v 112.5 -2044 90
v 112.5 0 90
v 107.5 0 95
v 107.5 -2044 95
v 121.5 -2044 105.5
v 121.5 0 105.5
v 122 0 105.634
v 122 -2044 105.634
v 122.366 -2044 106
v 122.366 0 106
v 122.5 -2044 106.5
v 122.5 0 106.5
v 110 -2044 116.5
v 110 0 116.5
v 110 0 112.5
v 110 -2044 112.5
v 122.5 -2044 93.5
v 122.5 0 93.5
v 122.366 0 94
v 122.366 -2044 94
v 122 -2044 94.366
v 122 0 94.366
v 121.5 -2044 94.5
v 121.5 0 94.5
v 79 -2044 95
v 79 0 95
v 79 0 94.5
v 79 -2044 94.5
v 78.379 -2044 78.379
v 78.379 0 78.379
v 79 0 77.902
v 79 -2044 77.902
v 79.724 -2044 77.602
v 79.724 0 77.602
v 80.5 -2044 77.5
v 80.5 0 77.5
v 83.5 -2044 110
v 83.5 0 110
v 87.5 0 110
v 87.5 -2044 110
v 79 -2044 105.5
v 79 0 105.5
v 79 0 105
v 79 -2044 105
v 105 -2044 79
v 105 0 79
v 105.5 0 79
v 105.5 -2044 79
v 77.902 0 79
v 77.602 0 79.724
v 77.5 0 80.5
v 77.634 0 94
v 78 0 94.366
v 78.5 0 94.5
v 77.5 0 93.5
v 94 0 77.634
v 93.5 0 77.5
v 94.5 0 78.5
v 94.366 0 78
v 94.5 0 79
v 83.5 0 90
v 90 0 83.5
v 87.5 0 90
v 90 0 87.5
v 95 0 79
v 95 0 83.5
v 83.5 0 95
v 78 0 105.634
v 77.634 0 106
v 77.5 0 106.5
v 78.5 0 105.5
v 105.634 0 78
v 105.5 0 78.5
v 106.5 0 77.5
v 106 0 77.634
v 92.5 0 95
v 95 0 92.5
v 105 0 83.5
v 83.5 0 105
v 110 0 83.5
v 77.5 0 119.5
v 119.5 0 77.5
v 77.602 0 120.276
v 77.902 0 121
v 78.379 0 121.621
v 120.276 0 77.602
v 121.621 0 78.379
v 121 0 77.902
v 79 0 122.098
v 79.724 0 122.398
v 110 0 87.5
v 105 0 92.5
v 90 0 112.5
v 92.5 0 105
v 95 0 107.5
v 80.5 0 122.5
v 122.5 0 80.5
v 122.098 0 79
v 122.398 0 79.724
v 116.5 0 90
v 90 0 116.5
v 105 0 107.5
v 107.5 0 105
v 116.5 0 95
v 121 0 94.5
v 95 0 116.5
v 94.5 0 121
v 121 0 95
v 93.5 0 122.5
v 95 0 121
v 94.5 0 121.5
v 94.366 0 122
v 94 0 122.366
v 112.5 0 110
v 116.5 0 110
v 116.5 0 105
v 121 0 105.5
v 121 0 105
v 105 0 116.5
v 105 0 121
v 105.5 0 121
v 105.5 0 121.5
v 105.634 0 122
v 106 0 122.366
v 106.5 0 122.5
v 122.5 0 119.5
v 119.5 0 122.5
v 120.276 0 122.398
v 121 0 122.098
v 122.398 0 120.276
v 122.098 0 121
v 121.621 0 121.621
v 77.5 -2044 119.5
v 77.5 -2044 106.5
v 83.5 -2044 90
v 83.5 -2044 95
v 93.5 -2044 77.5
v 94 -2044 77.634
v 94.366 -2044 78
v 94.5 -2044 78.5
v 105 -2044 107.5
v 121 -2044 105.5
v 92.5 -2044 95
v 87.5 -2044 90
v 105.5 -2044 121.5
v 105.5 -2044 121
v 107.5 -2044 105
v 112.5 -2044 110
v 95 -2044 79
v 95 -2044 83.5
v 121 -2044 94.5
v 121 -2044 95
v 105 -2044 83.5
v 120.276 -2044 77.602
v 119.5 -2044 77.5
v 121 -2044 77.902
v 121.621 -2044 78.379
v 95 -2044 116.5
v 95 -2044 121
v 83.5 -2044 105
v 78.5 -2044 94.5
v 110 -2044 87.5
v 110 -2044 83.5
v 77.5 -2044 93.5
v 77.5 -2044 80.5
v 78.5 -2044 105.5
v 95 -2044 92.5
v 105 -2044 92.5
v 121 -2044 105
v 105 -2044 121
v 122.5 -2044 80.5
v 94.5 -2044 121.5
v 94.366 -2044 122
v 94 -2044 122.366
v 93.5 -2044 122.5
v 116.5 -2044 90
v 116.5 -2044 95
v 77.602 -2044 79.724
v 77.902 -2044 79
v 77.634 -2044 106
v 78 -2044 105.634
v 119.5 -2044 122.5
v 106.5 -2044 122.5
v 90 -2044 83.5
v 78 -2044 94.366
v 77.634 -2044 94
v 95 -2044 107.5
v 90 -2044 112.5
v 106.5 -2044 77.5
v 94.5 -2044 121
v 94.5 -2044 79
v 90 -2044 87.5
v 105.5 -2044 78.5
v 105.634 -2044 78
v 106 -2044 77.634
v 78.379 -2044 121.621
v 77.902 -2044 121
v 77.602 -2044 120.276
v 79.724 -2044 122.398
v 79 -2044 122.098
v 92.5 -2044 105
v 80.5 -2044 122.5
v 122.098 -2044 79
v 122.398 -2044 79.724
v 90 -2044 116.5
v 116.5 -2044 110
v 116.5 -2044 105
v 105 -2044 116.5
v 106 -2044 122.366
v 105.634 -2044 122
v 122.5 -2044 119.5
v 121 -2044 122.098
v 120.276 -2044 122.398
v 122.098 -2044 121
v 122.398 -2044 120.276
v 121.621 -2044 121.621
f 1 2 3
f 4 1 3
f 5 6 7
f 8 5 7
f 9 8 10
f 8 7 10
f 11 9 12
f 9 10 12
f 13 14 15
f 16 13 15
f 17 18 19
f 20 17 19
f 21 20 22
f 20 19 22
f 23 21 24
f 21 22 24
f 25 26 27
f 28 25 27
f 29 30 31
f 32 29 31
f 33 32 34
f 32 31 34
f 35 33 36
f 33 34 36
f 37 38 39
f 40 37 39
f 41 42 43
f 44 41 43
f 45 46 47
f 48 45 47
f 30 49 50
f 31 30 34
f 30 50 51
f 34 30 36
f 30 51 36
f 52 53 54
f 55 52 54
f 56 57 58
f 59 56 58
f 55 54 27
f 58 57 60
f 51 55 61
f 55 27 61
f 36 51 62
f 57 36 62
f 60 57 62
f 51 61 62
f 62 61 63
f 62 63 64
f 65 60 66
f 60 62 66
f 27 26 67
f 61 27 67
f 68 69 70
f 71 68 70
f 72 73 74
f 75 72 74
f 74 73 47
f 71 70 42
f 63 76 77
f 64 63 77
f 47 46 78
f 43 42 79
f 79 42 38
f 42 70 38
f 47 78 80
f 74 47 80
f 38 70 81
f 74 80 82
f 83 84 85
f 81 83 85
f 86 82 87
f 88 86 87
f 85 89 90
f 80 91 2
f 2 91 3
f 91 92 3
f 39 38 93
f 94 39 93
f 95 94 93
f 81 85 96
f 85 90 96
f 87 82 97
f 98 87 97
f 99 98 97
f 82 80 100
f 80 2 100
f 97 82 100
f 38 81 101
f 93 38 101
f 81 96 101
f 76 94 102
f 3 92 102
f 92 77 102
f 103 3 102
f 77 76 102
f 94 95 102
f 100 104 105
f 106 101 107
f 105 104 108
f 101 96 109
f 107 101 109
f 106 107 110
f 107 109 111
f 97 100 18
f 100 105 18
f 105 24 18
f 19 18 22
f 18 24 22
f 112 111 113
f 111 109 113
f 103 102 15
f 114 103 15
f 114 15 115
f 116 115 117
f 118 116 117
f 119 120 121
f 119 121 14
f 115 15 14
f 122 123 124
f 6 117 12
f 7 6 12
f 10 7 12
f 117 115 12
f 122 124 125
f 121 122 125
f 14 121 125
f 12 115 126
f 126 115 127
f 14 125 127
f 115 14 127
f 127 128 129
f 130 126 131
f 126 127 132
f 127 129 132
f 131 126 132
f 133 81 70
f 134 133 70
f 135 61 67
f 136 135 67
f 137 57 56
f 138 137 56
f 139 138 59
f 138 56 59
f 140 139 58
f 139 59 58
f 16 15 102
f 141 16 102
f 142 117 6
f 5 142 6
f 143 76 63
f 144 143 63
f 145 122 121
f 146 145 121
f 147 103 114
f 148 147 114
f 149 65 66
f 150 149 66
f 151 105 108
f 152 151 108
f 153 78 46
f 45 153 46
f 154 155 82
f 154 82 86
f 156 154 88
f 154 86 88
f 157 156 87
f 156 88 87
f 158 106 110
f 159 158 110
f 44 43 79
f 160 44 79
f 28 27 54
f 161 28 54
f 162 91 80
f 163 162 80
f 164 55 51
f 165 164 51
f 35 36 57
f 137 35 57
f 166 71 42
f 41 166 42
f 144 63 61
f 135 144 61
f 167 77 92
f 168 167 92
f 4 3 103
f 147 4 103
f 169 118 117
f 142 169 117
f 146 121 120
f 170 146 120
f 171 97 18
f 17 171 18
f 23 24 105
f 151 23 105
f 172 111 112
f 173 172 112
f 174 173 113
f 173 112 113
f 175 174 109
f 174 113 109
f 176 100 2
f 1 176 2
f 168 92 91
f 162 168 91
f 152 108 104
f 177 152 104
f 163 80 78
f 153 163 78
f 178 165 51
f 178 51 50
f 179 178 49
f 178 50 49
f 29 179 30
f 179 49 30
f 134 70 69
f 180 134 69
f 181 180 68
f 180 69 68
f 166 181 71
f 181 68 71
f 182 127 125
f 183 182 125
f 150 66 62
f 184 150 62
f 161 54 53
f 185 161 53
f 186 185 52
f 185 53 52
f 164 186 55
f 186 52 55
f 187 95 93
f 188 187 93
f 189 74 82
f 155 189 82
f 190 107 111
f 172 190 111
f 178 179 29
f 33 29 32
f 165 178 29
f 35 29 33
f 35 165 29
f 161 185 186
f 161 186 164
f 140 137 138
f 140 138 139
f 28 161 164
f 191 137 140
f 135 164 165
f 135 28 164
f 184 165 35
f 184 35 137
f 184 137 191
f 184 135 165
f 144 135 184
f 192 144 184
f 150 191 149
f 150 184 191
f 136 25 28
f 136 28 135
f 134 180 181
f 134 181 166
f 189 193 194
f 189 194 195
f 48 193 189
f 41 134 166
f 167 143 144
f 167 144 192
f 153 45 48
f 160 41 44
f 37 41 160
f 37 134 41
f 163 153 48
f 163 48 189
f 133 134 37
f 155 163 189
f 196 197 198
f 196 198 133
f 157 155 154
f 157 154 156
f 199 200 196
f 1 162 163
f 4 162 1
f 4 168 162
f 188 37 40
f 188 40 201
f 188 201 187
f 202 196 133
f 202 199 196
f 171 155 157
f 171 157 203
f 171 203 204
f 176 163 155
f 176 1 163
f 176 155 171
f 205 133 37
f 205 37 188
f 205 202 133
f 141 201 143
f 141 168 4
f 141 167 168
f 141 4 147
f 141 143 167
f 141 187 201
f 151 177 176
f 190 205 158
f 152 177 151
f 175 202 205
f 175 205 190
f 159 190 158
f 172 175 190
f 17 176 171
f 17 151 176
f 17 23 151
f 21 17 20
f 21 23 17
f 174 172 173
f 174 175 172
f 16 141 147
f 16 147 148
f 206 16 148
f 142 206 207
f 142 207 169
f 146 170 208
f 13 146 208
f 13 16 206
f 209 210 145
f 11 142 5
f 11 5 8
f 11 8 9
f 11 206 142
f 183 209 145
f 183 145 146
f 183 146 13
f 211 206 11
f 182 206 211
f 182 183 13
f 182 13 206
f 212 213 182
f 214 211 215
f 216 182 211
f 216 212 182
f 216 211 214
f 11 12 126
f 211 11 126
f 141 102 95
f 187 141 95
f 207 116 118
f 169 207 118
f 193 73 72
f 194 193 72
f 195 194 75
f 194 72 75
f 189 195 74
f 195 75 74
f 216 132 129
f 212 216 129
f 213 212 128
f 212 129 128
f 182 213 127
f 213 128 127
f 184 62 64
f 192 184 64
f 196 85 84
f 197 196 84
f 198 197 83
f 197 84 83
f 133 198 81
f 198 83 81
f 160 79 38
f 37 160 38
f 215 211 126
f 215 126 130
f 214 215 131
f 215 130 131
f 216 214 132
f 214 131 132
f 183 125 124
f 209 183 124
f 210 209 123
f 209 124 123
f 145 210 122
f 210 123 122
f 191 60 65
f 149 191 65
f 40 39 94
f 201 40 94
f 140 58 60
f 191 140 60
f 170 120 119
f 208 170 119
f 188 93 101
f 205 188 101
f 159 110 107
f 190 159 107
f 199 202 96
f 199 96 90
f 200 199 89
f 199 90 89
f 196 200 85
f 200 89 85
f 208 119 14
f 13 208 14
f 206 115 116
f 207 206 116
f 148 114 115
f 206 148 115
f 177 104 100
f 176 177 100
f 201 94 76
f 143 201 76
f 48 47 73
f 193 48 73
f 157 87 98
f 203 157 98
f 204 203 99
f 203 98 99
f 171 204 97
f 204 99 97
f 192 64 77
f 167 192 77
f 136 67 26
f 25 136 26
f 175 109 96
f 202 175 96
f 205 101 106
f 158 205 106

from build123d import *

# Parameters (mm, degrees)
F1_DEPTH = 2044


with BuildPart() as f1:
    # F0 (on Front) → F1 (new body)
    with BuildSketch(Plane.XZ):
        with BuildLine():
            Line((93.5, 122.5), (80.5, 122.5))
            ThreePointArc((80.5, 122.5), (79.35195, 122.271639), (78.37868, 121.62132))
            ThreePointArc((78.37868, 121.62132), (77.728361, 120.64805), (77.5, 119.5))
            Line((77.5, 119.5), (77.5, 106.5))
            ThreePointArc((77.5, 106.5), (77.792893, 105.792893), (78.5, 105.5))
            Line((78.5, 105.5), (79, 105.5))
            Line((79, 105.5), (79, 105))
            Line((79, 105), (83.5, 105))
            Line((83.5, 105), (83.5, 110))
            Line((83.5, 110), (87.5, 110))
            Line((87.5, 110), (92.5, 105))
            Line((92.5, 105), (92.5, 100))
            Line((92.5, 100), (92.5, 95))
            Line((92.5, 95), (87.5, 90))
            Line((87.5, 90), (83.5, 90))
            Line((83.5, 90), (83.5, 95))
            Line((83.5, 95), (79, 95))
            Line((79, 95), (79, 94.5))
            Line((79, 94.5), (78.5, 94.5))
            ThreePointArc((78.5, 94.5), (77.792893, 94.207107), (77.5, 93.5))
            Line((77.5, 93.5), (77.5, 80.5))
            ThreePointArc((77.5, 80.5), (77.728361, 79.35195), (78.37868, 78.37868))
            ThreePointArc((78.37868, 78.37868), (79.35195, 77.728361), (80.5, 77.5))
            Line((80.5, 77.5), (93.5, 77.5))
            ThreePointArc((93.5, 77.5), (94.207107, 77.792893), (94.5, 78.5))
            Line((94.5, 78.5), (94.5, 79))
            Line((94.5, 79), (95, 79))
            Line((95, 79), (95, 83.5))
            Line((95, 83.5), (90, 83.5))
            Line((90, 83.5), (90, 87.5))
            Line((90, 87.5), (95, 92.5))
            Line((95, 92.5), (100, 92.5))
            Line((100, 92.5), (105, 92.5))
            Line((105, 92.5), (110, 87.5))
            Line((110, 87.5), (110, 83.5))
            Line((110, 83.5), (105, 83.5))
            Line((105, 83.5), (105, 79))
            Line((105, 79), (105.5, 79))
            Line((105.5, 79), (105.5, 78.5))
            ThreePointArc((105.5, 78.5), (105.792893, 77.792893), (106.5, 77.5))
            Line((106.5, 77.5), (119.5, 77.5))
            ThreePointArc((119.5, 77.5), (120.64805, 77.728361), (121.62132, 78.37868))
            ThreePointArc((121.62132, 78.37868), (122.271639, 79.35195), (122.5, 80.5))
            Line((122.5, 80.5), (122.5, 93.5))
            ThreePointArc((122.5, 93.5), (122.207107, 94.207107), (121.5, 94.5))
            Line((121.5, 94.5), (121, 94.5))
            Line((121, 94.5), (121, 95))
            Line((121, 95), (116.5, 95))
            Line((116.5, 95), (116.5, 90))
            Line((116.5, 90), (112.5, 90))
            Line((112.5, 90), (107.5, 95))
            Line((107.5, 95), (107.5, 100))
            Line((107.5, 100), (107.5, 105))
            Line((107.5, 105), (112.5, 110))
            Line((112.5, 110), (116.5, 110))
            Line((116.5, 110), (116.5, 105))
            Line((116.5, 105), (121, 105))
            Line((121, 105), (121, 105.5))
            Line((121, 105.5), (121.5, 105.5))
            ThreePointArc((121.5, 105.5), (122.207107, 105.792893), (122.5, 106.5))
            Line((122.5, 106.5), (122.5, 119.5))
            ThreePointArc((122.5, 119.5), (122.271639, 120.64805), (121.62132, 121.62132))
            ThreePointArc((121.62132, 121.62132), (120.64805, 122.271639), (119.5, 122.5))
            Line((119.5, 122.5), (106.5, 122.5))
            ThreePointArc((106.5, 122.5), (105.792893, 122.207107), (105.5, 121.5))
            Line((105.5, 121.5), (105.5, 121))
            Line((105.5, 121), (105, 121))
            Line((105, 121), (105, 116.5))
            Line((105, 116.5), (110, 116.5))
            Line((110, 116.5), (110, 112.5))
            Line((110, 112.5), (105, 107.5))
            Line((105, 107.5), (100, 107.5))
            Line((100, 107.5), (95, 107.5))
            Line((95, 107.5), (90, 112.5))
            Line((90, 112.5), (90, 116.5))
            Line((90, 116.5), (95, 116.5))
            Line((95, 116.5), (95, 121))
            Line((95, 121), (94.5, 121))
            Line((94.5, 121), (94.5, 121.5))
            ThreePointArc((94.5, 121.5), (94.207107, 122.207107), (93.5, 122.5))
        make_face()
    extrude(amount=F1_DEPTH)


solid = f1.part
